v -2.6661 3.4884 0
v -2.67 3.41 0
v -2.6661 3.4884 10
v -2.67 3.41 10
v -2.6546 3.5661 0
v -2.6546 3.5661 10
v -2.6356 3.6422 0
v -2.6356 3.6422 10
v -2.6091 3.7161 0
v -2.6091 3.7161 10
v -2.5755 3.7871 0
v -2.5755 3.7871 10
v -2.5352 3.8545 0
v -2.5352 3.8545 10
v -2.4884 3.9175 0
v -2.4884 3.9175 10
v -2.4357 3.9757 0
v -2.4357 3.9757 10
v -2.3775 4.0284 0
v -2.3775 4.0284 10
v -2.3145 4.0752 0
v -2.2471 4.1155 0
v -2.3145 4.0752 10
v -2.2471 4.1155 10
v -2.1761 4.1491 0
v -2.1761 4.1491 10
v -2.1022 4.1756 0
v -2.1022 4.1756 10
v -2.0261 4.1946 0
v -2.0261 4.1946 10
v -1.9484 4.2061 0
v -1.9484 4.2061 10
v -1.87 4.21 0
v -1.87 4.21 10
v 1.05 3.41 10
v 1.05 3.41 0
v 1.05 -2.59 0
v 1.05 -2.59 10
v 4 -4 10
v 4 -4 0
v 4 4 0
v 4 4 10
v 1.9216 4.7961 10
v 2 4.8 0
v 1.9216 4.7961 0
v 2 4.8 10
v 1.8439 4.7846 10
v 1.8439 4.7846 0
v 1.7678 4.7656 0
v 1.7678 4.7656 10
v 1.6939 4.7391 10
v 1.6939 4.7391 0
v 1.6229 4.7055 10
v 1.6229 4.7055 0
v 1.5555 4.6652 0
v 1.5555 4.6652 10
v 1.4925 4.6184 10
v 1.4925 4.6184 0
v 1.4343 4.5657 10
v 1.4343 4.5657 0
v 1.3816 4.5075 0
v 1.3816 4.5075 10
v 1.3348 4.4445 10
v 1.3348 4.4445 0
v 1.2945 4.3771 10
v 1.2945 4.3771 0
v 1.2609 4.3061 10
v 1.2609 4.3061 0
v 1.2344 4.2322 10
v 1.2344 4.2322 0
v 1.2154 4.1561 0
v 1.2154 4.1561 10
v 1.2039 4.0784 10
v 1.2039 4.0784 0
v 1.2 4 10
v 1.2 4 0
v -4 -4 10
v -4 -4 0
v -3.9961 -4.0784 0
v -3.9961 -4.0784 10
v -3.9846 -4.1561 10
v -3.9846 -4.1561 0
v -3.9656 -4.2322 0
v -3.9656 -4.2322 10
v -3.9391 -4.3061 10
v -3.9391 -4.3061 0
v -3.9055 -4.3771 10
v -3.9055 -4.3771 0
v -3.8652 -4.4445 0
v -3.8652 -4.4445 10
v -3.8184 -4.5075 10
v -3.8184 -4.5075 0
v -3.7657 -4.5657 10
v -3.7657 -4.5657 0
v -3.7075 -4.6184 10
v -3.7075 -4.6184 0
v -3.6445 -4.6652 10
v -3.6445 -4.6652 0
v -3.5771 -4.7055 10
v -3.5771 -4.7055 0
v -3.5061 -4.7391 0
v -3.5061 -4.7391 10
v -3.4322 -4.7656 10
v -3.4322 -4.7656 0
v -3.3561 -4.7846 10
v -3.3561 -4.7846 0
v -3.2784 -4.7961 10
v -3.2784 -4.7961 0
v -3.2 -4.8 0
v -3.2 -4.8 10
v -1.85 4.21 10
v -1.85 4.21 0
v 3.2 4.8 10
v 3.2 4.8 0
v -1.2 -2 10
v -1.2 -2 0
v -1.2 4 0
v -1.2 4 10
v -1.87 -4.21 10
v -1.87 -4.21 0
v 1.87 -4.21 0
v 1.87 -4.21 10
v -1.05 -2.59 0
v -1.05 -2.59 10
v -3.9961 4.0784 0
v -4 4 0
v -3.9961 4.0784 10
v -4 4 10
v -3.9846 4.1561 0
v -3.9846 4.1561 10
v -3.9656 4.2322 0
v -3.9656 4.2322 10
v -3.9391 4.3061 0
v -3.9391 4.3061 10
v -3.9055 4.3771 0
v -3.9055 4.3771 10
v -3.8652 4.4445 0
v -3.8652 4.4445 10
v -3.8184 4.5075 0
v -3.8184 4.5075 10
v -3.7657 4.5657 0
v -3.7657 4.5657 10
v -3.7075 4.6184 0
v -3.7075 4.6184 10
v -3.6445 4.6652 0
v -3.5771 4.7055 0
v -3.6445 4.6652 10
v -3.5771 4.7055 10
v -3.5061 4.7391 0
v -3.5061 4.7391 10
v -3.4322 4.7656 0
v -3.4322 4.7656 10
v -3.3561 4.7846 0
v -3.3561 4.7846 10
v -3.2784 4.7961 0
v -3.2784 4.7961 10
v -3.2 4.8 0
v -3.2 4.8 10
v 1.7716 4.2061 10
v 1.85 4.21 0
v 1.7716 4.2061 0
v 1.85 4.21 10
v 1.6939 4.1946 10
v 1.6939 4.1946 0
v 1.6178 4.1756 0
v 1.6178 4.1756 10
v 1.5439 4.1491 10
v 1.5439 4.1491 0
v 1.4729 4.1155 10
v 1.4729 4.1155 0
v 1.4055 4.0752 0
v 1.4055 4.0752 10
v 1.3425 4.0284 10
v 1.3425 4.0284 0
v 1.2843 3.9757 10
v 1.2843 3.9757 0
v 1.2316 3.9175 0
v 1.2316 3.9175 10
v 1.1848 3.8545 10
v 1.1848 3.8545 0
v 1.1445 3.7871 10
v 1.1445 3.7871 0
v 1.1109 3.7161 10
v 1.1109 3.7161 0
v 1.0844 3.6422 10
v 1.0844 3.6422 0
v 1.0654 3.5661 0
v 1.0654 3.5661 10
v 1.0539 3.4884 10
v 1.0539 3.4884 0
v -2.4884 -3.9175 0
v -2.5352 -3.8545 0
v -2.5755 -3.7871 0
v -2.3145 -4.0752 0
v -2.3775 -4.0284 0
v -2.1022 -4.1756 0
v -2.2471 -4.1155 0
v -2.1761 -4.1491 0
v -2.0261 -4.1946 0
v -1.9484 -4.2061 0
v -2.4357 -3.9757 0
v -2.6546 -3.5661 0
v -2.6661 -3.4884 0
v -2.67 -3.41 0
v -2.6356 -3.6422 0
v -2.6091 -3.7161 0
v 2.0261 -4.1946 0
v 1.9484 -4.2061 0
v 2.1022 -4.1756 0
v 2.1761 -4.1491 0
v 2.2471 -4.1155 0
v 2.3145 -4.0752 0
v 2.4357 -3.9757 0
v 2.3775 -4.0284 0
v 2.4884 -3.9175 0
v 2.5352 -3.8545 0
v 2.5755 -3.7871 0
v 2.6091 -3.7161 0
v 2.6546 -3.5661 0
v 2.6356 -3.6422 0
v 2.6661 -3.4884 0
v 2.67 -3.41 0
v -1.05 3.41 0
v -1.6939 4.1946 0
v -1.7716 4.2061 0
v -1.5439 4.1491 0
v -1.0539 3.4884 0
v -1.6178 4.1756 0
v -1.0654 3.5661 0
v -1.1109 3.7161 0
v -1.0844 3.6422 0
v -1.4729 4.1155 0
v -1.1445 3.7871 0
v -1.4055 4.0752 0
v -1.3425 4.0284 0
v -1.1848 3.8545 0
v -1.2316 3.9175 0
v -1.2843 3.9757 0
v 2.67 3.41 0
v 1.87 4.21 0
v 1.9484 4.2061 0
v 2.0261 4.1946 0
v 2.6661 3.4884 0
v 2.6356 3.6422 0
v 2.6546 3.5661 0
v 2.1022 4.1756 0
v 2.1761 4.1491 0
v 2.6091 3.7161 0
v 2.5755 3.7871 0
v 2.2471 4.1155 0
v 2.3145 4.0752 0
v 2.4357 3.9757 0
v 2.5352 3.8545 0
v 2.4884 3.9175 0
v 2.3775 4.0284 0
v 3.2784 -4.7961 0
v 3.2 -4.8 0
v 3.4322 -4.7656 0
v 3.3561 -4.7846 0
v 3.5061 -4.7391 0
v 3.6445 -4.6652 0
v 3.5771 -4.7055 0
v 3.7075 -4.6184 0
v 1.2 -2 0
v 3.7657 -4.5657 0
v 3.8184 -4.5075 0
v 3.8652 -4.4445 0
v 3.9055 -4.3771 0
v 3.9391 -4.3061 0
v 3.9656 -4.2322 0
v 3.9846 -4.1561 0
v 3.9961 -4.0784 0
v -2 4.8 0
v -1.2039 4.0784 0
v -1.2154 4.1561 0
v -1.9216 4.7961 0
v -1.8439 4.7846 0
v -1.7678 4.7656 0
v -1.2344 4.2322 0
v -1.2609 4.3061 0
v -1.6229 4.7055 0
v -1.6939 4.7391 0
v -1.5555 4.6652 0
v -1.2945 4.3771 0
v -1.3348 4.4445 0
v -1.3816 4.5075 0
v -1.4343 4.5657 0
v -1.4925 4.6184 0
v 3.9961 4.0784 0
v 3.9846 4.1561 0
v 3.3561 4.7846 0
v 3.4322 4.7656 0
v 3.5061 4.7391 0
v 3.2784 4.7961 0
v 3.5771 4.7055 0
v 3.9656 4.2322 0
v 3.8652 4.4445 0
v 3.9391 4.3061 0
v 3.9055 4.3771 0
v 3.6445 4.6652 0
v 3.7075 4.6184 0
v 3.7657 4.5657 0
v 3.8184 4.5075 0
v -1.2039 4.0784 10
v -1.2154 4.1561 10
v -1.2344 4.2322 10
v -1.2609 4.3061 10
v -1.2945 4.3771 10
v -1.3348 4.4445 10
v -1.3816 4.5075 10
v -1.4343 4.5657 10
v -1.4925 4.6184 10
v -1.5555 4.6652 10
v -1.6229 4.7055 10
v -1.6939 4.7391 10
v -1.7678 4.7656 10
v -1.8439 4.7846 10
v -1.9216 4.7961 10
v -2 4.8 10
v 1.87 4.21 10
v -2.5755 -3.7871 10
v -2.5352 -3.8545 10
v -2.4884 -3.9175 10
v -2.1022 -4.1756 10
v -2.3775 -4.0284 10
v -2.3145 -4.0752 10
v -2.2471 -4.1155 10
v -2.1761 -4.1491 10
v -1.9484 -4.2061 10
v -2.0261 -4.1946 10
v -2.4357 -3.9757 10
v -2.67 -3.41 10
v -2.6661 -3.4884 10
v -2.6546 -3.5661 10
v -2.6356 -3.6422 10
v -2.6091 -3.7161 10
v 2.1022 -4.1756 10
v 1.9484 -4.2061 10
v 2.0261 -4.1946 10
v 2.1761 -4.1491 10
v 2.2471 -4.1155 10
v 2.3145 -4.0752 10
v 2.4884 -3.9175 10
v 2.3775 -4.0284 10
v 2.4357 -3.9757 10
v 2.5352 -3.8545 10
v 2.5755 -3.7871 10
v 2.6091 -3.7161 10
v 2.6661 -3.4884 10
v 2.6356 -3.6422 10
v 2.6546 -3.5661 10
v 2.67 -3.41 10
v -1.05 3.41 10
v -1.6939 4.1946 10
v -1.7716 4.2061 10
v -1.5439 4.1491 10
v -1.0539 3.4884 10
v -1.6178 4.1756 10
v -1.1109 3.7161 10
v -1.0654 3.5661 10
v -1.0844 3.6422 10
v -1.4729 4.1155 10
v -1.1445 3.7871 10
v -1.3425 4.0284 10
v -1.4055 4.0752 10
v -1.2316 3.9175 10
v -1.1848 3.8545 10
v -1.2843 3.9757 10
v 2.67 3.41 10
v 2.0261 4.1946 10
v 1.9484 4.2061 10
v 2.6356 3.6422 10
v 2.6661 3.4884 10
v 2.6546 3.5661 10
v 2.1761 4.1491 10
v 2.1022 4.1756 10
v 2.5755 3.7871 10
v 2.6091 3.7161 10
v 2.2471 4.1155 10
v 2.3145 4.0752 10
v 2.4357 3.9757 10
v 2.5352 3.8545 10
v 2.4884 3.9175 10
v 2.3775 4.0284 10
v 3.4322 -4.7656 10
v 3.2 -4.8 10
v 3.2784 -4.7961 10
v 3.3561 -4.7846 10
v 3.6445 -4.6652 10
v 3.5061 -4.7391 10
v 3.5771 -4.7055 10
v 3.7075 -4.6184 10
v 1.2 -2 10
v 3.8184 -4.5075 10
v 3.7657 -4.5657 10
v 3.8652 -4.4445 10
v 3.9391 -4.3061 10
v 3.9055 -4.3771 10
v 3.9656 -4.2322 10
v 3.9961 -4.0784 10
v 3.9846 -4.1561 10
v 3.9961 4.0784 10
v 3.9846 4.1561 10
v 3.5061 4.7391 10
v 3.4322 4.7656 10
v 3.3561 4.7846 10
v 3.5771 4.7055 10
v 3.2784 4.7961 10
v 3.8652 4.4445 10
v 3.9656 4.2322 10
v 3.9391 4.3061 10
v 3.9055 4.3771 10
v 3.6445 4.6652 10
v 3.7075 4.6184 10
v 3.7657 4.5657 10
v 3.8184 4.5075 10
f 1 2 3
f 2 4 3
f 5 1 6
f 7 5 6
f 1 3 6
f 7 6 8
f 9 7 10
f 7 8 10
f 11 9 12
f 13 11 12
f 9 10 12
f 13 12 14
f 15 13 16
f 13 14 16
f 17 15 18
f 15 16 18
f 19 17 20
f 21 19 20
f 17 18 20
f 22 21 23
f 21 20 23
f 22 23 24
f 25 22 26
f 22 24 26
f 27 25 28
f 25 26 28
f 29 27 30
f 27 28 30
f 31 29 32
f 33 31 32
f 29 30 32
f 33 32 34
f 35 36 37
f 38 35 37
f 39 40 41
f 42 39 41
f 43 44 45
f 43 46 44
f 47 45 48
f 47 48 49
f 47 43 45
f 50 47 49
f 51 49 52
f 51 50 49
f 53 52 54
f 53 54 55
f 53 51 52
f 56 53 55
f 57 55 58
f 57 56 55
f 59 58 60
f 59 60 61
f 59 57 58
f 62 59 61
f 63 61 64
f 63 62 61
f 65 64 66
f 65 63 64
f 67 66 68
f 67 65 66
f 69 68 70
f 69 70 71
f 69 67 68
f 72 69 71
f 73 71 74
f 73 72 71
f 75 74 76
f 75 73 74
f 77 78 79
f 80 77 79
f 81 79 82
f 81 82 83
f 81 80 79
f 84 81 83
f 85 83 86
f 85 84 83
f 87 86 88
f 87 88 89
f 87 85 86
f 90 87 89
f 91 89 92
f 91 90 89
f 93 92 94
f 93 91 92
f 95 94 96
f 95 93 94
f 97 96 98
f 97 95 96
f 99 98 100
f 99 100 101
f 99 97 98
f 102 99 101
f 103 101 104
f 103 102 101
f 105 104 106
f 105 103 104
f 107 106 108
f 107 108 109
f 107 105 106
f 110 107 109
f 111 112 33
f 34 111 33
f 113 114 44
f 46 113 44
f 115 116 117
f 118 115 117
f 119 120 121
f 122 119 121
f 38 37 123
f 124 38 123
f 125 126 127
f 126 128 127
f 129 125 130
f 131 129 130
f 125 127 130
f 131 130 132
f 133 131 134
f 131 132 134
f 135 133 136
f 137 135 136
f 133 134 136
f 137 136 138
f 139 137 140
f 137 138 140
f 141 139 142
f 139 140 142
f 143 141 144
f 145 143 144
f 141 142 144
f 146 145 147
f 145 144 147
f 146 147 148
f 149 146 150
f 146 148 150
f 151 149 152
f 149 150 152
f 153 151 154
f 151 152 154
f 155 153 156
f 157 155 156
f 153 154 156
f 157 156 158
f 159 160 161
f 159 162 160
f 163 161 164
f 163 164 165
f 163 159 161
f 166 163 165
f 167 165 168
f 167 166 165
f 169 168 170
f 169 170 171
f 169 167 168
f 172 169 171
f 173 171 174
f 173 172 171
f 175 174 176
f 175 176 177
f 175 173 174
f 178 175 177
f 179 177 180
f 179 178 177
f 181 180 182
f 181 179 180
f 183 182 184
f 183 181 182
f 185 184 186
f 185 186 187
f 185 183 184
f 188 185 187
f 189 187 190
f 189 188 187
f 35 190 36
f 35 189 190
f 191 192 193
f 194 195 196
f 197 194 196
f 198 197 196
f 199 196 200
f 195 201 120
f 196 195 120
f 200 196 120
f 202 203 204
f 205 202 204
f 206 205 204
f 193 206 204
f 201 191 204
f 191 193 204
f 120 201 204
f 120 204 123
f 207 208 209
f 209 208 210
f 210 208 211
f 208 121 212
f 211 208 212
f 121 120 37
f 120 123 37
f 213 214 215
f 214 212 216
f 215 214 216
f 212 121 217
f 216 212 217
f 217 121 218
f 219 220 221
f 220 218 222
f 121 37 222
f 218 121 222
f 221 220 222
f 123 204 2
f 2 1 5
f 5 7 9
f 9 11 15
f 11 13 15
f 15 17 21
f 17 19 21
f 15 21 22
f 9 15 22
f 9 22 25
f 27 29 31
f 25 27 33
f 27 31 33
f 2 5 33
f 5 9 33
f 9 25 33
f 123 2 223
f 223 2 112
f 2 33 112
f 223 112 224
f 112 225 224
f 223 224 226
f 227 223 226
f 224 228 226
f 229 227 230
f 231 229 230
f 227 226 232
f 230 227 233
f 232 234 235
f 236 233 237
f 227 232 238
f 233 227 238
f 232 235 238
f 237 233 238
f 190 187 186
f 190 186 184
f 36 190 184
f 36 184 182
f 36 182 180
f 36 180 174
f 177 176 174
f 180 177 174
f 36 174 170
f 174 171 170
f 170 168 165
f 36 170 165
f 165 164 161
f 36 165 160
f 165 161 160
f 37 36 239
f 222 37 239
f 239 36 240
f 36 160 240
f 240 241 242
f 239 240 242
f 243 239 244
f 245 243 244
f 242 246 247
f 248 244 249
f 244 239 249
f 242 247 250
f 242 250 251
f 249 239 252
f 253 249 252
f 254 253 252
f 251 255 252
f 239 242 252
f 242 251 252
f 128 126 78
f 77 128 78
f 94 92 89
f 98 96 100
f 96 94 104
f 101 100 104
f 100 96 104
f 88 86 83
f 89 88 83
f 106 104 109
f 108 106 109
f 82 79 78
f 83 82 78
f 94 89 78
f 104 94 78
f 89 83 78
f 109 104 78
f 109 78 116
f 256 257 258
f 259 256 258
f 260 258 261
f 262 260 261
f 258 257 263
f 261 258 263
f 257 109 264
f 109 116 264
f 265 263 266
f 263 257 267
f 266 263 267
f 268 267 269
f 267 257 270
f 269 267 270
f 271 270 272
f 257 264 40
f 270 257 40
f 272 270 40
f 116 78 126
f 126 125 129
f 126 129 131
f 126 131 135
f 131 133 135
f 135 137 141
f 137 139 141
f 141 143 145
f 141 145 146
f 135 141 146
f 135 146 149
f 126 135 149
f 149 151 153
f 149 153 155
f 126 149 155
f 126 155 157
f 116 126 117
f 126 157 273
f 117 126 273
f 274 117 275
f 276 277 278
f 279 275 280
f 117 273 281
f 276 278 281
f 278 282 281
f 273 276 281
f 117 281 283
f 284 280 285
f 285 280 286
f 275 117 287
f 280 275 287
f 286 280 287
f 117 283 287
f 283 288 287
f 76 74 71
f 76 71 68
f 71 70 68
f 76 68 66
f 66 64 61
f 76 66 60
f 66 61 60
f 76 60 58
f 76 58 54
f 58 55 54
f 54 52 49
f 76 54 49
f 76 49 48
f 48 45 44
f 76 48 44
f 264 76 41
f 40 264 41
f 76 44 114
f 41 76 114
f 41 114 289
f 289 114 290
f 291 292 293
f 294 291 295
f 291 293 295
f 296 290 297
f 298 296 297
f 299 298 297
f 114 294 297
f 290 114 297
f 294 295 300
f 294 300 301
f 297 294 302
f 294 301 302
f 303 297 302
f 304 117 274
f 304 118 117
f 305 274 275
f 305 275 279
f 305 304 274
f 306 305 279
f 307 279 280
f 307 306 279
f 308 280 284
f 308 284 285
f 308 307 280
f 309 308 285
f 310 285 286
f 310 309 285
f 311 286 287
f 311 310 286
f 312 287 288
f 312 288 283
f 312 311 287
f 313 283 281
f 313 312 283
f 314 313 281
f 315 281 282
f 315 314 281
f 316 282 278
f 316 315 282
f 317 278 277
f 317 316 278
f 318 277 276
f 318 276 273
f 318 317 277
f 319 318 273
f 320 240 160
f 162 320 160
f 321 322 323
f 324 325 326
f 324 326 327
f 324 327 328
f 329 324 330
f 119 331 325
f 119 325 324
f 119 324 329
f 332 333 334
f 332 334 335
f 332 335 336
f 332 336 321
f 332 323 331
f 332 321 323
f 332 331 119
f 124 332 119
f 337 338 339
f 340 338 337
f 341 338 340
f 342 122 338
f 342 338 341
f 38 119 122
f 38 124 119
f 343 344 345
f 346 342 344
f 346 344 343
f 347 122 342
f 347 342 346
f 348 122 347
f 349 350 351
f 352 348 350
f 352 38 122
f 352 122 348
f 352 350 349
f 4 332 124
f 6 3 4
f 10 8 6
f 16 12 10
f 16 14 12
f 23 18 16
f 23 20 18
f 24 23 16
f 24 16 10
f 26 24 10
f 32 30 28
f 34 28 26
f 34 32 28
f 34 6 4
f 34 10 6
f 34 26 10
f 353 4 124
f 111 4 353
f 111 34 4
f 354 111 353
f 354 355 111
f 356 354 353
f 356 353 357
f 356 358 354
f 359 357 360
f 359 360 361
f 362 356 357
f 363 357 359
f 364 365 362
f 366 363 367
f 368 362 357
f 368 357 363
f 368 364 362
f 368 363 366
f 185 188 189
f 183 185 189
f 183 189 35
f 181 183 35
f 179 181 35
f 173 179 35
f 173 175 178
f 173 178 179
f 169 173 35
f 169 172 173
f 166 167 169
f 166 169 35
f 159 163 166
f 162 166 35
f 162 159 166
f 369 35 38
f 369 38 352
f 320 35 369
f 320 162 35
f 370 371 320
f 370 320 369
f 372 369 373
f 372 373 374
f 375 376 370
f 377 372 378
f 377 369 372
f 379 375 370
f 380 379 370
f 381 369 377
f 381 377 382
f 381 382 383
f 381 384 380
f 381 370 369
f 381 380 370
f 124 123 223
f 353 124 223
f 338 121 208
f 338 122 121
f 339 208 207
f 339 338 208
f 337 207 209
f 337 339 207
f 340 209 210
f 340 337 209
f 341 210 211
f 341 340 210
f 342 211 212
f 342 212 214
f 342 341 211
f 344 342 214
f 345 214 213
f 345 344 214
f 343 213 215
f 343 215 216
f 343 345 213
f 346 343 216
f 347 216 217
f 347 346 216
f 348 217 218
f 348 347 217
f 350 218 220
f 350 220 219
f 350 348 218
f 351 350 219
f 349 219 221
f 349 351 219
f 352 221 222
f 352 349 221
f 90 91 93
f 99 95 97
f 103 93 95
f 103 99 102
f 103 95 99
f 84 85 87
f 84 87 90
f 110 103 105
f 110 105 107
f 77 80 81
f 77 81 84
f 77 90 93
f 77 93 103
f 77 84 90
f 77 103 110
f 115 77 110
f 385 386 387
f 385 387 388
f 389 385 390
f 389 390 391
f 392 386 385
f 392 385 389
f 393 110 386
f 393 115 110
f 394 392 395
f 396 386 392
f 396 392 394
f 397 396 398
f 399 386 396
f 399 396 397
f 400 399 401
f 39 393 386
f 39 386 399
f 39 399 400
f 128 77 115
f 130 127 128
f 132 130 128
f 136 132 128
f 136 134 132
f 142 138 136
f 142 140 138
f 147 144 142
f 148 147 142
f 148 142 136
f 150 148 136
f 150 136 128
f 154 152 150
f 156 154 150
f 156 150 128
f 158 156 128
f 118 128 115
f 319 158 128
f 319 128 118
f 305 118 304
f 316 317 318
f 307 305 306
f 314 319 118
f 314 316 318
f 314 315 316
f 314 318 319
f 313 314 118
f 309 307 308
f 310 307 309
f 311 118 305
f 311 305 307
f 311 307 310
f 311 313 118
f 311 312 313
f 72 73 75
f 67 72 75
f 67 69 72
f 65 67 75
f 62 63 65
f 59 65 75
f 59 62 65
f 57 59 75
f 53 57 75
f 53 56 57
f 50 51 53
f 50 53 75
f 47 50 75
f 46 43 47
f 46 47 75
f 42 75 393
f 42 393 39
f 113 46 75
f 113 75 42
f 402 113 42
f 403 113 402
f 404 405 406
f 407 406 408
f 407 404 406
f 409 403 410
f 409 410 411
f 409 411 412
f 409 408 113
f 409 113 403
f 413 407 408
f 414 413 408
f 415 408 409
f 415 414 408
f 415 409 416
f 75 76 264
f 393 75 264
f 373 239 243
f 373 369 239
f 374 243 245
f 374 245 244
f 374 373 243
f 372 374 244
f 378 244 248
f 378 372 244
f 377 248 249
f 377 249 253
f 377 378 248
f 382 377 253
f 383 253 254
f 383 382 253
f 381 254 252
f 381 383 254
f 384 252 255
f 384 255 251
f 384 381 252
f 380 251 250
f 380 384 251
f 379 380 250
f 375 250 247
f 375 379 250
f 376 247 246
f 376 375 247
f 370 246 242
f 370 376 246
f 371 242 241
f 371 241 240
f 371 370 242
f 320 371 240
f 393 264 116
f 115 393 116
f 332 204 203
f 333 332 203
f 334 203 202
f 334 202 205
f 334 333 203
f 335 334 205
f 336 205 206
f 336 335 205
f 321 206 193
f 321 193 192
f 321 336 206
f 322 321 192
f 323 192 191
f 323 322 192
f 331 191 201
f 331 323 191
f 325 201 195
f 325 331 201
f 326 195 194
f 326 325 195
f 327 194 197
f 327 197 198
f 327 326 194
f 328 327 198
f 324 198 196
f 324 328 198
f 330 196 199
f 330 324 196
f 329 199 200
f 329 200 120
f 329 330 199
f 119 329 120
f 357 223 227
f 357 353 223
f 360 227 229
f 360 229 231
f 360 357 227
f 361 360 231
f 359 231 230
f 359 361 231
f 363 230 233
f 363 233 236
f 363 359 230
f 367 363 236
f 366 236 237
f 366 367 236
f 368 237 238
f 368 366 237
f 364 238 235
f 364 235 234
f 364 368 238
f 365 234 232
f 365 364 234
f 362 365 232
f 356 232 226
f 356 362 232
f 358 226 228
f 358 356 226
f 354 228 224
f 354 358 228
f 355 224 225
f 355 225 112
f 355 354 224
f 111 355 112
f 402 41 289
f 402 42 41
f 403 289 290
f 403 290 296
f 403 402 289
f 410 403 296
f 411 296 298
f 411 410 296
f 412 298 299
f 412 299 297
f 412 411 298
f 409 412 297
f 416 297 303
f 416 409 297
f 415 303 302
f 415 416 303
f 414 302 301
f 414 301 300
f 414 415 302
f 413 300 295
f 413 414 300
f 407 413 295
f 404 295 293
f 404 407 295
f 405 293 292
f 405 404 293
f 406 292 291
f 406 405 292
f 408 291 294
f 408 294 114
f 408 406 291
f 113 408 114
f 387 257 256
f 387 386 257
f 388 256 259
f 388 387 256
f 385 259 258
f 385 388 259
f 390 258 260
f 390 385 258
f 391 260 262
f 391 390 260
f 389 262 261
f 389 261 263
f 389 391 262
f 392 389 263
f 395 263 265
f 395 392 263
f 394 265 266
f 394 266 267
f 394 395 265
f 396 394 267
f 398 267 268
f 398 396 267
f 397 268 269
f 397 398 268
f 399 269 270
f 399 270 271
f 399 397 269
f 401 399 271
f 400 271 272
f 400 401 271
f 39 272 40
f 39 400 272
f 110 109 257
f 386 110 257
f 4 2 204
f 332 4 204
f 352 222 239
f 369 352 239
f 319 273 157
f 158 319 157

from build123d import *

# Parameters (mm, degrees)
PAD_DEPTH    = 10
FILLET_R     = 0.8
PAD001_DEPTH = 10
FILLET001_R  = 0.8


with BuildPart() as filletbody:
    # Sketch → Pad (new body)
    with BuildSketch(Plane.XY):
        Polygon((-4, 4.8), (-4, -4.8), (4, -4.8), (4, 4.8), (1.2, 4.8), (1.2, -2), (-1.2, -2), (-1.2, 4.8), align=None)
    extrude(amount=PAD_DEPTH)

    # Fillet
    fillet_edges = [filletbody.edges().sort_by_distance(p)[0] for p in [
        (-4, -4.8, 5),
        (4, -4.8, 5),
        (4, 4.8, 5),
        (1.2, 4.8, 5),
        (-4, 4.8, 5),
        (-1.2, 4.8, 5),
    ]]
    fillet(fillet_edges, radius=FILLET_R)


with BuildPart() as filletbody001:
    # Sketch001 → Pad001 (new body)
    with BuildSketch(Plane.XY):
        Polygon((-2.67, 4.21), (-2.67, -4.21), (2.67, -4.21), (2.67, 4.21), (1.05, 4.21), (1.05, -2.59), (-1.05, -2.59), (-1.05, 4.21), align=None)
    extrude(amount=PAD001_DEPTH)

    # Fillet001
    fillet001_edges = [filletbody001.edges().sort_by_distance(p)[0] for p in [
        (-2.67, -4.21, 5),
        (2.67, -4.21, 5),
        (2.67, 4.21, 5),
        (1.05, 4.21, 5),
        (-2.67, 4.21, 5),
        (-1.05, 4.21, 5),
    ]]
    fillet(fillet001_edges, radius=FILLET001_R)


solid = Compound([filletbody.part, filletbody001.part])
